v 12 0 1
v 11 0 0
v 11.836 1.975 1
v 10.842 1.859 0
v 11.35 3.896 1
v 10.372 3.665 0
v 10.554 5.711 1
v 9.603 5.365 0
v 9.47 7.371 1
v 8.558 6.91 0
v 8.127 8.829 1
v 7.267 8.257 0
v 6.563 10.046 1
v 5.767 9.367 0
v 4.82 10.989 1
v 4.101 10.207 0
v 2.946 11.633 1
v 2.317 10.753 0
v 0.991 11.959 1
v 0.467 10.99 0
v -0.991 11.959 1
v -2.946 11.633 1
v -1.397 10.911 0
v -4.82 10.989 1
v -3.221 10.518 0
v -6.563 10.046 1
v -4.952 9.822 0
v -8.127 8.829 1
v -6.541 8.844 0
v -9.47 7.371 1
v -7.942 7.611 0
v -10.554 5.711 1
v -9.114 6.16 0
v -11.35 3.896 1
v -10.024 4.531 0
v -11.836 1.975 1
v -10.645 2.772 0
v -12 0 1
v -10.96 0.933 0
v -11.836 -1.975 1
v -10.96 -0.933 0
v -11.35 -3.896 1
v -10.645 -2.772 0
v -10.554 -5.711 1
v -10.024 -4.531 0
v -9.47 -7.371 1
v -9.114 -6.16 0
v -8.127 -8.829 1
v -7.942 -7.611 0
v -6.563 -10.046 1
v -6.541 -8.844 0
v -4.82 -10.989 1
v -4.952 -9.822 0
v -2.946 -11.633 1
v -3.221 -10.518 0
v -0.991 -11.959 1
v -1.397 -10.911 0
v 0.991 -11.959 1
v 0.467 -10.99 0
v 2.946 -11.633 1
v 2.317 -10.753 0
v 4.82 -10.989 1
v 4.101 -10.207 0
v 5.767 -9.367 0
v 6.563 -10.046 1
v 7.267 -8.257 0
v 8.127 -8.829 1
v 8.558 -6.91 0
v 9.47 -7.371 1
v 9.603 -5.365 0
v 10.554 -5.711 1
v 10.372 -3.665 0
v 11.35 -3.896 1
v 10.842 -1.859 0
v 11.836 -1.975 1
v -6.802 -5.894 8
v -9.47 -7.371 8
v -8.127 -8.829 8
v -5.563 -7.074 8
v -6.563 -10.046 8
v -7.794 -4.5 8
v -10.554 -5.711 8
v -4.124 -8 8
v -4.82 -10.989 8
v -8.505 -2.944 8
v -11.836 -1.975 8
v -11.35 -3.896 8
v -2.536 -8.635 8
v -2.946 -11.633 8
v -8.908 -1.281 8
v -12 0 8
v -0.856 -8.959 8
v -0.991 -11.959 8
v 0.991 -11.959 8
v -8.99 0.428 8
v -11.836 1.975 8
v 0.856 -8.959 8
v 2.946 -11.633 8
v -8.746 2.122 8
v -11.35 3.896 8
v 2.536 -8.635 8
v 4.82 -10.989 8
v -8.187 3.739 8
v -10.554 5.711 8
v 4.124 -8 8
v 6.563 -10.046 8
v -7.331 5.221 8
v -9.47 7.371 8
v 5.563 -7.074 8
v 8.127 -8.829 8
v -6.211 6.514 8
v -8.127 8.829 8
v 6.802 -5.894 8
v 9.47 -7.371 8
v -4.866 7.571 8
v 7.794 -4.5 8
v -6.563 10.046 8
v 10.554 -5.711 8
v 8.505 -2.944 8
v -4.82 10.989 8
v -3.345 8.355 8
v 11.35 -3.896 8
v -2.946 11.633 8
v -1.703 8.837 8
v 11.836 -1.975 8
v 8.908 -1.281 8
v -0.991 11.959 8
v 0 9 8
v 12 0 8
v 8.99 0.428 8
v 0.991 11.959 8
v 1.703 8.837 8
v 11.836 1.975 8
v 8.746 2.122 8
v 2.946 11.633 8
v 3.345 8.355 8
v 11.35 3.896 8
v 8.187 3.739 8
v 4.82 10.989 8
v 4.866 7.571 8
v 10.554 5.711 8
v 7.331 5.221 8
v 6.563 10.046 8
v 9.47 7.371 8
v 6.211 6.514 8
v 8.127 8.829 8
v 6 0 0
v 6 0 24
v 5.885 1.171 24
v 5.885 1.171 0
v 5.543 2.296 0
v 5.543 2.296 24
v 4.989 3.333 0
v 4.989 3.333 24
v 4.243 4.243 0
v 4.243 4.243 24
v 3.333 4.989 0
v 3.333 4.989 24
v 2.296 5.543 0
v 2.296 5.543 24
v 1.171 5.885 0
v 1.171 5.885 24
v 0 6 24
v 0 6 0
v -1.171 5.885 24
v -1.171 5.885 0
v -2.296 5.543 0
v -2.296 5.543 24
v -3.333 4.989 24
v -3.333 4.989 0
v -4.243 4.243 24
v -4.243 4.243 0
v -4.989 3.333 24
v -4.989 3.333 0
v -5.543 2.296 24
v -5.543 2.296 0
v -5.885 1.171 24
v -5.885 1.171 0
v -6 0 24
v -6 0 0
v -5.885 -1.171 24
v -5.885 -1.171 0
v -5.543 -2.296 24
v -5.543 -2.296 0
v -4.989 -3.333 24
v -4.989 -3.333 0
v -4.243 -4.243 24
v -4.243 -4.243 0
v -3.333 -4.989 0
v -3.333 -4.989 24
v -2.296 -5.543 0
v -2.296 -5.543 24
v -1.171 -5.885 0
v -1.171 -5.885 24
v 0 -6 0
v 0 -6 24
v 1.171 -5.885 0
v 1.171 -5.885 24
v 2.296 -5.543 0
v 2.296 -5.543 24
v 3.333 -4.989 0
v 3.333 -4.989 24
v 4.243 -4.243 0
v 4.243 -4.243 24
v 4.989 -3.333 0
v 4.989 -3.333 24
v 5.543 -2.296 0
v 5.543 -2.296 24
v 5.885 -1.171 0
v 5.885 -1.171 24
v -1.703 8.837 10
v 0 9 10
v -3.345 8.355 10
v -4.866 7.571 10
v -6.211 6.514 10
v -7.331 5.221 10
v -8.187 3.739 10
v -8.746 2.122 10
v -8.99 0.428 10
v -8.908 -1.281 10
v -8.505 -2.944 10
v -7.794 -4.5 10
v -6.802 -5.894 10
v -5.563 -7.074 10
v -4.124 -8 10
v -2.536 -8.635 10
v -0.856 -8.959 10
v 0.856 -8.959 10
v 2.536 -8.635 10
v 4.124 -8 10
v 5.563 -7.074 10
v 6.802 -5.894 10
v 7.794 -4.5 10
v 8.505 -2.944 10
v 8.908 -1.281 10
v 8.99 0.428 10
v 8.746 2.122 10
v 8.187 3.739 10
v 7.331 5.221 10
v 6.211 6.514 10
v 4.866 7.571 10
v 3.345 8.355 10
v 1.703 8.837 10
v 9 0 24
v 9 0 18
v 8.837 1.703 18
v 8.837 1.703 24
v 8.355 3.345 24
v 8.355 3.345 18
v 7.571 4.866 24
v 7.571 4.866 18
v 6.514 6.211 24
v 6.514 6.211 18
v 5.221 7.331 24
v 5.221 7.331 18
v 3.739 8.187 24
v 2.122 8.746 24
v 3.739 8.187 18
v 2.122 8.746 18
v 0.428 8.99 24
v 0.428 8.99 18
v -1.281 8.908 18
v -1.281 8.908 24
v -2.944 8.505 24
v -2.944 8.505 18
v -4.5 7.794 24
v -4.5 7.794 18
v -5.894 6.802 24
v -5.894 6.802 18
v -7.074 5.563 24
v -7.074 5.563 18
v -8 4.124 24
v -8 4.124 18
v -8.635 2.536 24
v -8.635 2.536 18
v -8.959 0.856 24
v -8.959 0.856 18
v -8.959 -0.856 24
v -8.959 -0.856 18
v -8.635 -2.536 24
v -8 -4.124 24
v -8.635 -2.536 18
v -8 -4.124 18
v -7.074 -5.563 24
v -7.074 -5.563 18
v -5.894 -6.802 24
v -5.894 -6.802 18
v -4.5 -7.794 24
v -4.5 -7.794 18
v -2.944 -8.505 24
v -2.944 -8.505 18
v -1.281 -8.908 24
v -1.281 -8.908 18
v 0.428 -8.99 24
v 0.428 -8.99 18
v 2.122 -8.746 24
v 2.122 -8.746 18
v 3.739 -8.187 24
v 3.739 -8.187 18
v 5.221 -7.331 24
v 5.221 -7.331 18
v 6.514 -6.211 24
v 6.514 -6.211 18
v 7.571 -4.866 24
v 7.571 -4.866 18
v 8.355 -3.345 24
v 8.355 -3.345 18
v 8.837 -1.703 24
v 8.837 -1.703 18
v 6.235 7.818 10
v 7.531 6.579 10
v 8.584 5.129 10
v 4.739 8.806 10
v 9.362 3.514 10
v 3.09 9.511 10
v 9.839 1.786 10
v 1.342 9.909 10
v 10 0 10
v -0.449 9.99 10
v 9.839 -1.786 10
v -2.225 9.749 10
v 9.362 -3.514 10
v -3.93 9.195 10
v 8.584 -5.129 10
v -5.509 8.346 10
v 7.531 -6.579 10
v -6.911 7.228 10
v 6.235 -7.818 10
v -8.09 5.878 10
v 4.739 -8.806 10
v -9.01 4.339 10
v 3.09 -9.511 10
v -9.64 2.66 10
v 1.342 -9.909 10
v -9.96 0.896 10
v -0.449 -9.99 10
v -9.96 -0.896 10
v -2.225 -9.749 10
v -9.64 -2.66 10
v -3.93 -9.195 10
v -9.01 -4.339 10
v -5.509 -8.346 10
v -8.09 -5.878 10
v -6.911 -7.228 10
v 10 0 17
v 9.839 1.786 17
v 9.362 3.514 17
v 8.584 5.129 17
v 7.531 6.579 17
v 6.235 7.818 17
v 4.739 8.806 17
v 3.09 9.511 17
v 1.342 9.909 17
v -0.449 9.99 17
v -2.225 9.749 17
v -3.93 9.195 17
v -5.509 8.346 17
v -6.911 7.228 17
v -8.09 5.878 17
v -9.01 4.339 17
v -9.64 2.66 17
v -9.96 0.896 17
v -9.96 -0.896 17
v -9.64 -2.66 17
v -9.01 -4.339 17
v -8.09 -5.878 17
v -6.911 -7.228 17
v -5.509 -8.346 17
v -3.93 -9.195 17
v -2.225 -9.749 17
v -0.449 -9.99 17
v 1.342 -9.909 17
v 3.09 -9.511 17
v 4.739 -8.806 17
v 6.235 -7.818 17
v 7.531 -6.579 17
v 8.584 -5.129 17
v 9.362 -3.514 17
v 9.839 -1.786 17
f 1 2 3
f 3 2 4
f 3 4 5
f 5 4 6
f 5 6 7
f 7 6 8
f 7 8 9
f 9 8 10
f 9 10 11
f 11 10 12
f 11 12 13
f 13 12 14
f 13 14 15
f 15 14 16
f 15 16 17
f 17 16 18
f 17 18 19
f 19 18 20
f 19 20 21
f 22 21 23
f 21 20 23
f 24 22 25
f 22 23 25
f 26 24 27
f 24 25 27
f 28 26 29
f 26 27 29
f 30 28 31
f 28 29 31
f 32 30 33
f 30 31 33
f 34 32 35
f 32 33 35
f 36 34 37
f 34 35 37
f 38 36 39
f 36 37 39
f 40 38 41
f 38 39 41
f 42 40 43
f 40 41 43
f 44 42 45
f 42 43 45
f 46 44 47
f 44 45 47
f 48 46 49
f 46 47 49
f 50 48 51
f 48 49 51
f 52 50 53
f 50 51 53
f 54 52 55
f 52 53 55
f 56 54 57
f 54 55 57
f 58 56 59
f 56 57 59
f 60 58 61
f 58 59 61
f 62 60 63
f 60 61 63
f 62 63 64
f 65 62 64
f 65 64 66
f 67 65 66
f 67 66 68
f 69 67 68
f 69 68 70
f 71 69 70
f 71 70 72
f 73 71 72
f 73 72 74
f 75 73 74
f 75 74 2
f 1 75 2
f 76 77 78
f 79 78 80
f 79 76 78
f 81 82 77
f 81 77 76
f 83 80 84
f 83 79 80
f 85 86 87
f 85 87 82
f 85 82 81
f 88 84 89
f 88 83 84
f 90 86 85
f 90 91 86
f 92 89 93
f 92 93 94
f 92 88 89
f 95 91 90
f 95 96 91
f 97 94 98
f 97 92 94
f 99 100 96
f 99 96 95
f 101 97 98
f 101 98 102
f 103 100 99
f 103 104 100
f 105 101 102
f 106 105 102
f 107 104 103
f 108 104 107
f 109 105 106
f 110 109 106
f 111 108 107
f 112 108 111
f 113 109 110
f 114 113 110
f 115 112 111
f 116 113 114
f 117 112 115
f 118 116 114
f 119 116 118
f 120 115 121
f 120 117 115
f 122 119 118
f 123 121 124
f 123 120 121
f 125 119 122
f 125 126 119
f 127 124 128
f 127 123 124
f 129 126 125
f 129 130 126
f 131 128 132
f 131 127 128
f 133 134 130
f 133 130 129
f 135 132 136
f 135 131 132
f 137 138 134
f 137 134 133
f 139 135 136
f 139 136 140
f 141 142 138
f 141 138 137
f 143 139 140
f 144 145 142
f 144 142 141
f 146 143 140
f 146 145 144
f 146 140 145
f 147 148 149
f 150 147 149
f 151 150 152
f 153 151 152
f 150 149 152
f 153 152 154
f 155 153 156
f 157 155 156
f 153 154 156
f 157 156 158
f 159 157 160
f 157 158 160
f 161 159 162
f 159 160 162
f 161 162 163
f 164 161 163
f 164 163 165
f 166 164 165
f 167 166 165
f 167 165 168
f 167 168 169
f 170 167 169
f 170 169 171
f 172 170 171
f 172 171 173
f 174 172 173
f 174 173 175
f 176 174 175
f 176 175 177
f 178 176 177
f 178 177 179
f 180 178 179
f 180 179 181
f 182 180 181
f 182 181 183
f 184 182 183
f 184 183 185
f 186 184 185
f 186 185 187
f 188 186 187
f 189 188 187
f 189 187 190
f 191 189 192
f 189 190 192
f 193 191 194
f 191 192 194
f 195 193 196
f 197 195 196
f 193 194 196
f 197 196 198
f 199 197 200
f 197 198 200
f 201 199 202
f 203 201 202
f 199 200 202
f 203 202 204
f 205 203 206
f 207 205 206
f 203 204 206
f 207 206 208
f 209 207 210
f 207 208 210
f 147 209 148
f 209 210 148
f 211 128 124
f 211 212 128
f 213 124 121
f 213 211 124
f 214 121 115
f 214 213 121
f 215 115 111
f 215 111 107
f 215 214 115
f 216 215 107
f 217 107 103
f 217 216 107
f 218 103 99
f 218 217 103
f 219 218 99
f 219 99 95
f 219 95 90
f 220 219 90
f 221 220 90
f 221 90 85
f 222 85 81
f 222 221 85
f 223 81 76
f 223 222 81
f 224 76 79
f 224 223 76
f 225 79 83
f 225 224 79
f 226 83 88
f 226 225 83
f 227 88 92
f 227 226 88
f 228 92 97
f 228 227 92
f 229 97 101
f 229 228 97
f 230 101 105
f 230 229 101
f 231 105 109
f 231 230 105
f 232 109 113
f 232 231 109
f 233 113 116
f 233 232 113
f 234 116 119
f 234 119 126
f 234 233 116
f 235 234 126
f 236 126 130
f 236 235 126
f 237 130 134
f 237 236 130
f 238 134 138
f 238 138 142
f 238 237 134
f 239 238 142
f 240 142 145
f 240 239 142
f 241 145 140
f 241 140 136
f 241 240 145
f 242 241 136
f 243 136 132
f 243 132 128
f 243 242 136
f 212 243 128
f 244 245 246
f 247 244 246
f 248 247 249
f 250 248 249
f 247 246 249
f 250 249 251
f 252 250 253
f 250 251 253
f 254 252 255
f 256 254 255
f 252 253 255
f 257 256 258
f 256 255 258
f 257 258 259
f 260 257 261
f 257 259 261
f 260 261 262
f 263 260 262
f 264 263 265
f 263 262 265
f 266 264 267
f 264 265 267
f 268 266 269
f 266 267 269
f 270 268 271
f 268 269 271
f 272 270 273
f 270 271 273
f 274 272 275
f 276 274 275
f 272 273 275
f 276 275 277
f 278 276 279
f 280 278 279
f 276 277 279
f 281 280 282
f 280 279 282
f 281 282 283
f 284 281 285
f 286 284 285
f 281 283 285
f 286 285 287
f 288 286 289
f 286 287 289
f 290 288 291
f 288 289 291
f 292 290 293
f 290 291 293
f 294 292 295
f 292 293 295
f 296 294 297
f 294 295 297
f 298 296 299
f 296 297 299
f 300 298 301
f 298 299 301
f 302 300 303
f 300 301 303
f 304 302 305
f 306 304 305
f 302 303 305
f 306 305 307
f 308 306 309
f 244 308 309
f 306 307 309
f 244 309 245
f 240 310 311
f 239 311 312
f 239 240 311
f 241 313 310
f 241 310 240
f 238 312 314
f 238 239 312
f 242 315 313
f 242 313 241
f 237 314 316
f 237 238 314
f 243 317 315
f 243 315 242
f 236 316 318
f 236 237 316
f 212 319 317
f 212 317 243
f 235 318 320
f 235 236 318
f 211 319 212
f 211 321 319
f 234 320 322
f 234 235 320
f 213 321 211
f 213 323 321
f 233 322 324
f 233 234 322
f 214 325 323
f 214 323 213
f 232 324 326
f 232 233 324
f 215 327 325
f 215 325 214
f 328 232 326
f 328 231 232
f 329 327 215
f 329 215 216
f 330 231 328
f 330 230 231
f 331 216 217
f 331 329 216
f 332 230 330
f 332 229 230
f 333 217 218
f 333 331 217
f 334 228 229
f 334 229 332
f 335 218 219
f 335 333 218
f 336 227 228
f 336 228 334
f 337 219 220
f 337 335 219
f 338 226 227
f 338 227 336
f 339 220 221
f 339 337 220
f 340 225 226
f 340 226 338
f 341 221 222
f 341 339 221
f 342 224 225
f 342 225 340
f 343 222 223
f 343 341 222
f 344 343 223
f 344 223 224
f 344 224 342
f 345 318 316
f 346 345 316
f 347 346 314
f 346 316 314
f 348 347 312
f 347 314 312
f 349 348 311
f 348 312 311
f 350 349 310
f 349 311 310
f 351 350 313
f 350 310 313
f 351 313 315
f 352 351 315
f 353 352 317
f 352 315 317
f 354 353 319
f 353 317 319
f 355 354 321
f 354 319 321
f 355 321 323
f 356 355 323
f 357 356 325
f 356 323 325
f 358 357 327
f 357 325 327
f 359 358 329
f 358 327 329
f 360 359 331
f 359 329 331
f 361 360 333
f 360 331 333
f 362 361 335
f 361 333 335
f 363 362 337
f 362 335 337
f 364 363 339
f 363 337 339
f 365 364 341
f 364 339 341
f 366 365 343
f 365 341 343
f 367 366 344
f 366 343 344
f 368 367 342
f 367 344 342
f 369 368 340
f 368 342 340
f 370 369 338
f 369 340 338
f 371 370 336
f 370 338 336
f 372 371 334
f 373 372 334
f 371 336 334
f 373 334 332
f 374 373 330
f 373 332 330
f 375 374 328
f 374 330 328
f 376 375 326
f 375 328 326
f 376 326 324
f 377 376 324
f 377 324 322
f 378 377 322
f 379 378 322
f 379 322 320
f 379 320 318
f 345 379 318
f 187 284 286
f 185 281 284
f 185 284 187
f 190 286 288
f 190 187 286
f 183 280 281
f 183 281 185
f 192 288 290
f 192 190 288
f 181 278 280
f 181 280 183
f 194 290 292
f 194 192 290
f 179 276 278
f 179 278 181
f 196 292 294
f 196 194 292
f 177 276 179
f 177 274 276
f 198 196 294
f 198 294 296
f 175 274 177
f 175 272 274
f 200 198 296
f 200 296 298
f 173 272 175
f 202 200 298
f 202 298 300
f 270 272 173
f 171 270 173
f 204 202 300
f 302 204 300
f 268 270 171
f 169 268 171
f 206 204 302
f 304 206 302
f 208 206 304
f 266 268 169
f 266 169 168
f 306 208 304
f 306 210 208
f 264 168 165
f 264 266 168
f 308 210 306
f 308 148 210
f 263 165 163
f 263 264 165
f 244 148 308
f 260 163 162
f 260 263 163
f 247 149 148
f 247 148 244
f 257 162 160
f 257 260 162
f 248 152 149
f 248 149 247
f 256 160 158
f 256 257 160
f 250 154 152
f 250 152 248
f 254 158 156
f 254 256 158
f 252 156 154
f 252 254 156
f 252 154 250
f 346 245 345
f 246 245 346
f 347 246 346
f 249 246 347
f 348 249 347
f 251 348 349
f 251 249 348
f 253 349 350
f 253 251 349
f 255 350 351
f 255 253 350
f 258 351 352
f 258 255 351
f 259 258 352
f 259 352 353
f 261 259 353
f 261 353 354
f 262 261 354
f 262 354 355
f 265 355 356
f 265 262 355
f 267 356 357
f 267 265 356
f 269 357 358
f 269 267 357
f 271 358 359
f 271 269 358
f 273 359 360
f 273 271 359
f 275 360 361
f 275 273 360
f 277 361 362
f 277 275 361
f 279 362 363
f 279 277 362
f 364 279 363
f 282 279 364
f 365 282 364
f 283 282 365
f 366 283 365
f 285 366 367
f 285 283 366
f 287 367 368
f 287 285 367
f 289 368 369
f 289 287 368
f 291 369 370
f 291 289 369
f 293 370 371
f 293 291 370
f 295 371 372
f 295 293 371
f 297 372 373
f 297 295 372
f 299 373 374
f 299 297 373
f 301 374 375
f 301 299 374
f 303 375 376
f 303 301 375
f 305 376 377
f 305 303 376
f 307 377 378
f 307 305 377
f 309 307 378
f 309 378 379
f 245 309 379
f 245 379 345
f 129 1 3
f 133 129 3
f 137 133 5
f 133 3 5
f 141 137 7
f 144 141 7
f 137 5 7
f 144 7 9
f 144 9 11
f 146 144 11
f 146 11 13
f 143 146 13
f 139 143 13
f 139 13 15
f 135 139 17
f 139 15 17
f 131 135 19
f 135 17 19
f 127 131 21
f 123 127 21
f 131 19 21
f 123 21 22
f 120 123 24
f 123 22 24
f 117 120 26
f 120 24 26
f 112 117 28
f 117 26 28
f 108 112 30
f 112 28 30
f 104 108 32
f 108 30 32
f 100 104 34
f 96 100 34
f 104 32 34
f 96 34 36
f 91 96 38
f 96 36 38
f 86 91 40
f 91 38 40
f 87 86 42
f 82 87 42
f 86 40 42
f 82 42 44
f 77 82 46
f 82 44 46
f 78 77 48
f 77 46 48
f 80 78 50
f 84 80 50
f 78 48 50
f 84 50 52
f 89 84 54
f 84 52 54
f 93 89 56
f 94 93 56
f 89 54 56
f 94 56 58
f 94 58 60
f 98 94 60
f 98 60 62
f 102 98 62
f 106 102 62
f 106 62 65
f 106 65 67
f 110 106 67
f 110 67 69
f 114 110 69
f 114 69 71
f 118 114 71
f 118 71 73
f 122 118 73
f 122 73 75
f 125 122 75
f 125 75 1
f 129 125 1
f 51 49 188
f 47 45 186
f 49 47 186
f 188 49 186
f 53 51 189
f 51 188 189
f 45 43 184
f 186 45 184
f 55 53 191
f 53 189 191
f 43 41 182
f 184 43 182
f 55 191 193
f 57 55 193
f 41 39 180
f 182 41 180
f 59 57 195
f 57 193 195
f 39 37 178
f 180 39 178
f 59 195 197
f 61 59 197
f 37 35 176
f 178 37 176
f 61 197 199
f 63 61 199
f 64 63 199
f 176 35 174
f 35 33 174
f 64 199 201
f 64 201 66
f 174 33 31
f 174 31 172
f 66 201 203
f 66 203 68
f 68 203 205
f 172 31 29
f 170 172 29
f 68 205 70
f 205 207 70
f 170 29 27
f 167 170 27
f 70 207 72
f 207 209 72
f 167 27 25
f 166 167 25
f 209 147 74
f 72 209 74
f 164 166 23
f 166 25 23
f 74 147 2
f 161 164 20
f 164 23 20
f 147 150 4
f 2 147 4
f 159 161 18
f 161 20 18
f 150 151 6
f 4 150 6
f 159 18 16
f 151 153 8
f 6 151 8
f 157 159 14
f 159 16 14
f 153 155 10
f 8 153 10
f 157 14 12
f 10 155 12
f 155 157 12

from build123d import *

# Parameters (mm, degrees)
F0_R      = 12
F1_DEPTH  = 8
F2_R      = 10
F3_DEPTH  = 10
F4_R      = 9
F5_DEPTH  = 6
F6_W      = 1
F6_H      = 2
F9_SIZE   = 1
F10_SIZE  = 0.99999
F11_R     = 6
F12_DEPTH = 42.1


# Not quite as in the source:
# - a fillet or chamfer is up to 0.001 mm smaller than in the source, because OpenCascade refuses the exact size


with BuildPart() as f1:
    # F0 (on Top) → F1 (new body)
    with BuildSketch(Plane.XY):
        Circle(F0_R)
    extrude(amount=F1_DEPTH)

    # F2 (on face) → F3 (join)
    with BuildSketch(Plane.XY.offset(8)):
        Circle(F2_R)
    extrude(amount=F3_DEPTH)

    # F4 (on face) → F5 (join)
    with BuildSketch(Plane.XY.offset(18)):
        Circle(F4_R)
    extrude(amount=F5_DEPTH)

    # F6 (on Right) → F8 (revolve, cut)
    with BuildSketch(Plane.YZ):
        with Locations((9.5, 9)):
            Rectangle(F6_W, F6_H)
    revolve(axis=Axis((0, 0, 13.7254064903), (0, 0, 1)), mode=Mode.SUBTRACT)

    # F9
    f9_edges = [f1.edges().sort_by_distance(p)[0] for p in [
        (-12, 0, 0),
    ]]
    chamfer(f9_edges, length=F9_SIZE)

    # F10 (size 1 in the source; OpenCascade refuses exactly that, so slightly less here)
    f10_edges = [f1.edges().sort_by_distance(p)[0] for p in [
        (-10, 0, 18),
    ]]
    chamfer(f10_edges, length=F10_SIZE)

    # F11 (on face) → F12 (cut)
    with BuildSketch(Plane.XY.offset(24)):
        Circle(F11_R)
    extrude(amount=-F12_DEPTH, mode=Mode.SUBTRACT)


solid = f1.part
